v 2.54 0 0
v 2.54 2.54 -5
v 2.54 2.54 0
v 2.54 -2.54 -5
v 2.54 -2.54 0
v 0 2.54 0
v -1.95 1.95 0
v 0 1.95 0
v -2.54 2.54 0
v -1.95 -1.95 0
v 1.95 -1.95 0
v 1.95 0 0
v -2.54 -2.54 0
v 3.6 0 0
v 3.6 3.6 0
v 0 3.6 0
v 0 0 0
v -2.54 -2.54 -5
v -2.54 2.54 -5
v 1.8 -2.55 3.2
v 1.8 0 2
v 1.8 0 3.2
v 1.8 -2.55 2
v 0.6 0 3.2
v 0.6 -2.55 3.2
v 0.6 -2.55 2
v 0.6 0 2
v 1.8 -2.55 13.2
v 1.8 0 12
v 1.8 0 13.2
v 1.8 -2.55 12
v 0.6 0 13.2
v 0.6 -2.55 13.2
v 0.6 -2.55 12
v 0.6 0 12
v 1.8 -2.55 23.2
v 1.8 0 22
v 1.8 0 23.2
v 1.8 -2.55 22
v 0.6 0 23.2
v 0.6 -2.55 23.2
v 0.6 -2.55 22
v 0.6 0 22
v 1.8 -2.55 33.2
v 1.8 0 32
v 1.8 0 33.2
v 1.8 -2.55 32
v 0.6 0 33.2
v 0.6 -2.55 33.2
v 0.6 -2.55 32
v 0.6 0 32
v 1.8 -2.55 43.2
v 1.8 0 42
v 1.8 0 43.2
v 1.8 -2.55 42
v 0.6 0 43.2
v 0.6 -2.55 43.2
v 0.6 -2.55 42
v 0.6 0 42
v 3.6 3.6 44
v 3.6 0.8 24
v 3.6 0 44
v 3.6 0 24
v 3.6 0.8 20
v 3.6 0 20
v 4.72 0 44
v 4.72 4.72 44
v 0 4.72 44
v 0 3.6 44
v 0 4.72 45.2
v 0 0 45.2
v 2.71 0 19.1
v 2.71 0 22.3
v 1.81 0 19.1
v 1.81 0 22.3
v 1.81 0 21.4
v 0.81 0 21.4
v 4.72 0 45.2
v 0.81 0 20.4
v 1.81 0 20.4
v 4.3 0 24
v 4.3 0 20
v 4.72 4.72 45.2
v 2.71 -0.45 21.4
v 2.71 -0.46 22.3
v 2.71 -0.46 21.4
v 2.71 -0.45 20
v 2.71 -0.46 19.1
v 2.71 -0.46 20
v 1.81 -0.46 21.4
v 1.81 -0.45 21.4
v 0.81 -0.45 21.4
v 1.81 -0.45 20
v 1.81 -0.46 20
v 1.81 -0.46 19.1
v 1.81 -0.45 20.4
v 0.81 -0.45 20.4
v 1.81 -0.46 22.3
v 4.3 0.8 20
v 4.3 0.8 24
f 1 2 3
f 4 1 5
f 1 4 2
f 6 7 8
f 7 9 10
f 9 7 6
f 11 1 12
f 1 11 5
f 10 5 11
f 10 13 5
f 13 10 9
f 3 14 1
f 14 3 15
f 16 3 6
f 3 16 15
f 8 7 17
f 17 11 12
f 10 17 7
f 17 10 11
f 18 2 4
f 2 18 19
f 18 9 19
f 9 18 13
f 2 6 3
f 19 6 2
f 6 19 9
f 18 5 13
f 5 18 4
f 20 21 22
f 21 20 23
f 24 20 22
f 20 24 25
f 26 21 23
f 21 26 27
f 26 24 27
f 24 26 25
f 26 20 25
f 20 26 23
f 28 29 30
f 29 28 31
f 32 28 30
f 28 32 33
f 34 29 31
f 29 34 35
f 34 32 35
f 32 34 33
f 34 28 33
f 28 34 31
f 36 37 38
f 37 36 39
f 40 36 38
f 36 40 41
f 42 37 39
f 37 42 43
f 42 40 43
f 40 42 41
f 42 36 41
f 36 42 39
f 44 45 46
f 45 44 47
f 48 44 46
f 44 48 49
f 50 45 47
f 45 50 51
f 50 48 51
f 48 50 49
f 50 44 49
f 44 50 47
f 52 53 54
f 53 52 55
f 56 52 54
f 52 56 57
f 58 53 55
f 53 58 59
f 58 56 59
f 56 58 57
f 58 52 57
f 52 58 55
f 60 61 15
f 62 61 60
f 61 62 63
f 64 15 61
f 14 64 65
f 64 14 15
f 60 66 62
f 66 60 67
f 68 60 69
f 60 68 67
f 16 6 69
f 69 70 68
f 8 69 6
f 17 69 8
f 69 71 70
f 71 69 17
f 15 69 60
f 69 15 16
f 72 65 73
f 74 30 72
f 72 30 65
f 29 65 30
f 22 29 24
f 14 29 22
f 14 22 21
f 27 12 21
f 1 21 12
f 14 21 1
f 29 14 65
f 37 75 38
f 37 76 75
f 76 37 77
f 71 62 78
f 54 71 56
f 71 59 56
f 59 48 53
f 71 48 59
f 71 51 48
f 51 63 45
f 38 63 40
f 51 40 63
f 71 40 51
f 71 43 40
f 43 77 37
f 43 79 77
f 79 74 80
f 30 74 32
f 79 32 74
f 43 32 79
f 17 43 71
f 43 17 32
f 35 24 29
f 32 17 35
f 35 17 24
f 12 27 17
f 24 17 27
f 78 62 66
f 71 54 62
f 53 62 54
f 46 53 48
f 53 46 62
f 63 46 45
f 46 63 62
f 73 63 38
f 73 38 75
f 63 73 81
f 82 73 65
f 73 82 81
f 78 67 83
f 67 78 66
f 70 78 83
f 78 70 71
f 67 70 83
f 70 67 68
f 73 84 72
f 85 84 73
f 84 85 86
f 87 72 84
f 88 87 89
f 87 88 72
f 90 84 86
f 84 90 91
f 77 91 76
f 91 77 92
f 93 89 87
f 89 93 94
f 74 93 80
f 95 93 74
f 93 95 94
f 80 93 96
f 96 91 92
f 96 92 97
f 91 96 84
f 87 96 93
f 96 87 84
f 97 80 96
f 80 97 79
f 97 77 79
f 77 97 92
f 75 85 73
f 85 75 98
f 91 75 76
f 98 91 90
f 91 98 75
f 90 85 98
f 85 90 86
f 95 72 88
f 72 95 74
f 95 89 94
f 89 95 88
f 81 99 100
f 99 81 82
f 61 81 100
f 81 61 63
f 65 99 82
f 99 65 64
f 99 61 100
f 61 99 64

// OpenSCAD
// DND-106 (child of DND-104) -- reliability-first cell / mechanism CAD witness.
//
// This file is the CAD witness for the InventorAlpha reliability primitives
// (see 09-low-cost-variant/divergent/reliability_primitives_alpha.py).  It
// models, at the true 5.08 mm surface pitch:
//
//   * R2 -- the DOUBLE-ACTING WEDGE-GATE CELL: a two-position sliding gate
//     between two printed hard stops, sitting in the 1.48 mm lane beside a
//     3.60 mm column body.  The high stop is a printed wall; the low stop is
//     reached by the platen pushing the gate down (a driven, positive reset,
//     replacing S6-LC's release-and-trust-gravity reset).
//   * R1 -- the TOGGLE-ROCKER ROW MODULE: one off-pitch rocker per row with a
//     4-step staircase that the passive column teeth rest on.  The module is
//     deliberately OFF the 5.08 mm cell pitch (02-design-criteria: internal
//     machinery may be larger / shared / external).
//   * R3 -- the READ COMB finger that seats against a gate (detectable state).
//
// EVIDENCE CLASS: CAD (this file + the analytic printability checker).  It is
// NOT a print and NOT a measurement.  See 02-design-criteria for the sourced
// FDM limits and DND-27 for the no-print/no-purchase/no-measure constraint.
//
// Units: mm. Target process: Bambu X1C, PLA, 0.4 mm nozzle, 0.2 mm layers.

// --- shared surface scale ---------------------------------------------------
PITCH = 5.08;
LEVELS = 5;
TRAVEL = 40.0;

// --- unchanged visible column (S1 coupon conventions) -----------------------
COLUMN_CAP = 4.72;
COLUMN_BODY = 3.60;
RACK_PITCH = 10.0;
RACK_POCKETS = 5;
POCKET_DEPTH = 1.20;
POCKET_WIDTH = 2.40;

// --- R2: double-acting wedge gate -------------------------------------------
GATE_BODY_T = 0.90;             // 2-line sliding wedge (>= 0.88 mm robust)
GATE_THROW = 1.40;              // travel between the two hard stops
GATE_LANE = 1.48;               // lane beside the column body (pitch - body)
GATE_SHOULDER = 1.00;           // shoulder that blocks the column tooth
GATE_LOW_STOP = 0.90;           // printed low-stop wall
GATE_HIGH_STOP = 0.90;          // printed high-stop wall

// --- R1: row rocker + 4-step staircase (off-pitch module) -------------------
ROCKER_ARM_T = 1.32;            // 3-line load-bearing arm
ROCKER_STEPS = 4;               // 0/10/20/30/40 mm staircase
STEP_RISE = RACK_PITCH;         // 10 mm per step (level height)
STEP_TOOTH_W = 0.90;            // 2-line step/ledge tooth
STEP_TOOTH_L = 2.40;
ROTOR_R = 2.00;                 // printed rocker pivot boss radius
ROTOR_BORE_CLEAR = 0.25;        // printed boss-in-socket free play (total)

// --- R3: read-comb finger ---------------------------------------------------
FINGER_T = 0.90;                // 2-line compliant finger
FINGER_L = 4.00;
FINGER_W = 0.80;                // < 2-line in Y: it is a compliant sensor,
                                // reported by the checker as a sensing risk,
                                // not a load-bearing wall

// --- printed housing / base -------------------------------------------------
WALL = 0.90;
BASE = 3.00;
MIN_FDM_WALL = 0.44;

$fn = 48;
EPS = 0.01;

module column() {
    cube([COLUMN_BODY, COLUMN_BODY, TRAVEL + 4.0], center = false);
    translate([0, 0, TRAVEL + 4.0])
        cube([COLUMN_CAP, COLUMN_CAP, 1.2], center = false);
    // 5-pocket rack on one face (height is set by which pocket the pawl rests in)
    for (k = [0:RACK_POCKETS - 1])
        translate([COLUMN_BODY / 2 - POCKET_DEPTH, -PITCH / 2 - EPS,
                   k * RACK_PITCH + 2.0])
            cube([POCKET_DEPTH, PITCH + 2 * EPS, 1.2]);
}

module wedge_gate() {
    // R2: sliding wedge gate in the lane, between two printed hard stops.
    // high stop (raised state) at the top, low stop (lowered) at the bottom.
    translate([COLUMN_BODY / 2 + EPS, -GATE_BODY_T / 2, TRAVEL * 0.5])
        cube([GATE_BODY_T, GATE_BODY_T, GATE_THROW]);
    // the gate's shoulder that blocks the column lift tooth when raised
    translate([COLUMN_BODY / 2 - GATE_SHOULDER + EPS,
               -GATE_BODY_T / 2, TRAVEL * 0.5 + GATE_THROW - GATE_SHOULDER])
        cube([GATE_SHOULDER, GATE_BODY_T, GATE_SHOULDER]);
}

module gate_stops() {
    // printed hard stops: raised wall above, lowered wall below.
    translate([COLUMN_BODY / 2 + EPS, -GATE_BODY_T / 2 - EPS,
               TRAVEL * 0.5 + GATE_THROW])
        cube([GATE_BODY_T, GATE_BODY_T + 2 * EPS, GATE_HIGH_STOP]);
    translate([COLUMN_BODY / 2 + EPS, -GATE_BODY_T / 2 - EPS,
               TRAVEL * 0.5 - GATE_LOW_STOP])
        cube([GATE_BODY_T, GATE_BODY_T + 2 * EPS, GATE_LOW_STOP]);
}

module r2_cell() {
    column();
    wedge_gate();
    gate_stops();
}

// R1 row rocker module: OFF-PITCH (placed beside the row) with a 4-step
// staircase whose steps the passive column teeth rest on.
module row_rocker() {
    // rocker arm (load-bearing, 3-line)
    translate([-8.0, -ROCKER_ARM_T / 2, 0])
        cube([12.0, ROCKER_ARM_T, ROCKER_ARM_T]);
    // pivot boss
    translate([-8.0, 0, 0]) cylinder(r = ROTOR_R, h = ROCKER_ARM_T);
    // 4-step staircase carried by the rocker
    for (k = [0:ROCKER_STEPS - 1])
        translate([k * STEP_TOOTH_L, -STEP_TOOTH_W / 2, k * STEP_RISE])
            cube([STEP_TOOTH_L, STEP_TOOTH_W, STEP_TOOTH_W]);
}

module r3_read_finger() {
    // compliant read finger that seats against a gate to sense its state
    translate([0, 0, 0]) cube([FINGER_T, FINGER_W, FINGER_L]);
}

module frame() {
    difference() {
        translate([-PITCH / 2, -PITCH / 2, -BASE - 2.0])
            cube([PITCH, PITCH, BASE + 2.0]);
        translate([-COLUMN_BODY / 2 - 0.15, -COLUMN_BODY / 2 - 0.15, 0])
            cube([COLUMN_BODY + 0.30, COLUMN_BODY + 0.30, TRAVEL + 6.0],
                 center = false);
    }
}

module reliability_cell_assembly() {
    frame();
    r2_cell();
    translate([COLUMN_BODY / 2 + 1.6, 0, TRAVEL * 0.5]) r3_read_finger();
}

// The 5x3 true-pitch coupon witness: 5 columns x 3 rows at 5.08 mm pitch.
module coupon_witness() {
    for (i = [0:4]) for (j = [0:2])
        translate([i * PITCH, j * PITCH, 0]) reliability_cell_assembly();
}

part = "assembly";

if (part == "assembly") {
    reliability_cell_assembly();
} else if (part == "coupon") {
    coupon_witness();
} else if (part == "column") {
    column();
} else if (part == "gate") {
    wedge_gate();
} else if (part == "stops") {
    gate_stops();
} else if (part == "rocker") {
    row_rocker();
} else if (part == "finger") {
    r3_read_finger();
}
